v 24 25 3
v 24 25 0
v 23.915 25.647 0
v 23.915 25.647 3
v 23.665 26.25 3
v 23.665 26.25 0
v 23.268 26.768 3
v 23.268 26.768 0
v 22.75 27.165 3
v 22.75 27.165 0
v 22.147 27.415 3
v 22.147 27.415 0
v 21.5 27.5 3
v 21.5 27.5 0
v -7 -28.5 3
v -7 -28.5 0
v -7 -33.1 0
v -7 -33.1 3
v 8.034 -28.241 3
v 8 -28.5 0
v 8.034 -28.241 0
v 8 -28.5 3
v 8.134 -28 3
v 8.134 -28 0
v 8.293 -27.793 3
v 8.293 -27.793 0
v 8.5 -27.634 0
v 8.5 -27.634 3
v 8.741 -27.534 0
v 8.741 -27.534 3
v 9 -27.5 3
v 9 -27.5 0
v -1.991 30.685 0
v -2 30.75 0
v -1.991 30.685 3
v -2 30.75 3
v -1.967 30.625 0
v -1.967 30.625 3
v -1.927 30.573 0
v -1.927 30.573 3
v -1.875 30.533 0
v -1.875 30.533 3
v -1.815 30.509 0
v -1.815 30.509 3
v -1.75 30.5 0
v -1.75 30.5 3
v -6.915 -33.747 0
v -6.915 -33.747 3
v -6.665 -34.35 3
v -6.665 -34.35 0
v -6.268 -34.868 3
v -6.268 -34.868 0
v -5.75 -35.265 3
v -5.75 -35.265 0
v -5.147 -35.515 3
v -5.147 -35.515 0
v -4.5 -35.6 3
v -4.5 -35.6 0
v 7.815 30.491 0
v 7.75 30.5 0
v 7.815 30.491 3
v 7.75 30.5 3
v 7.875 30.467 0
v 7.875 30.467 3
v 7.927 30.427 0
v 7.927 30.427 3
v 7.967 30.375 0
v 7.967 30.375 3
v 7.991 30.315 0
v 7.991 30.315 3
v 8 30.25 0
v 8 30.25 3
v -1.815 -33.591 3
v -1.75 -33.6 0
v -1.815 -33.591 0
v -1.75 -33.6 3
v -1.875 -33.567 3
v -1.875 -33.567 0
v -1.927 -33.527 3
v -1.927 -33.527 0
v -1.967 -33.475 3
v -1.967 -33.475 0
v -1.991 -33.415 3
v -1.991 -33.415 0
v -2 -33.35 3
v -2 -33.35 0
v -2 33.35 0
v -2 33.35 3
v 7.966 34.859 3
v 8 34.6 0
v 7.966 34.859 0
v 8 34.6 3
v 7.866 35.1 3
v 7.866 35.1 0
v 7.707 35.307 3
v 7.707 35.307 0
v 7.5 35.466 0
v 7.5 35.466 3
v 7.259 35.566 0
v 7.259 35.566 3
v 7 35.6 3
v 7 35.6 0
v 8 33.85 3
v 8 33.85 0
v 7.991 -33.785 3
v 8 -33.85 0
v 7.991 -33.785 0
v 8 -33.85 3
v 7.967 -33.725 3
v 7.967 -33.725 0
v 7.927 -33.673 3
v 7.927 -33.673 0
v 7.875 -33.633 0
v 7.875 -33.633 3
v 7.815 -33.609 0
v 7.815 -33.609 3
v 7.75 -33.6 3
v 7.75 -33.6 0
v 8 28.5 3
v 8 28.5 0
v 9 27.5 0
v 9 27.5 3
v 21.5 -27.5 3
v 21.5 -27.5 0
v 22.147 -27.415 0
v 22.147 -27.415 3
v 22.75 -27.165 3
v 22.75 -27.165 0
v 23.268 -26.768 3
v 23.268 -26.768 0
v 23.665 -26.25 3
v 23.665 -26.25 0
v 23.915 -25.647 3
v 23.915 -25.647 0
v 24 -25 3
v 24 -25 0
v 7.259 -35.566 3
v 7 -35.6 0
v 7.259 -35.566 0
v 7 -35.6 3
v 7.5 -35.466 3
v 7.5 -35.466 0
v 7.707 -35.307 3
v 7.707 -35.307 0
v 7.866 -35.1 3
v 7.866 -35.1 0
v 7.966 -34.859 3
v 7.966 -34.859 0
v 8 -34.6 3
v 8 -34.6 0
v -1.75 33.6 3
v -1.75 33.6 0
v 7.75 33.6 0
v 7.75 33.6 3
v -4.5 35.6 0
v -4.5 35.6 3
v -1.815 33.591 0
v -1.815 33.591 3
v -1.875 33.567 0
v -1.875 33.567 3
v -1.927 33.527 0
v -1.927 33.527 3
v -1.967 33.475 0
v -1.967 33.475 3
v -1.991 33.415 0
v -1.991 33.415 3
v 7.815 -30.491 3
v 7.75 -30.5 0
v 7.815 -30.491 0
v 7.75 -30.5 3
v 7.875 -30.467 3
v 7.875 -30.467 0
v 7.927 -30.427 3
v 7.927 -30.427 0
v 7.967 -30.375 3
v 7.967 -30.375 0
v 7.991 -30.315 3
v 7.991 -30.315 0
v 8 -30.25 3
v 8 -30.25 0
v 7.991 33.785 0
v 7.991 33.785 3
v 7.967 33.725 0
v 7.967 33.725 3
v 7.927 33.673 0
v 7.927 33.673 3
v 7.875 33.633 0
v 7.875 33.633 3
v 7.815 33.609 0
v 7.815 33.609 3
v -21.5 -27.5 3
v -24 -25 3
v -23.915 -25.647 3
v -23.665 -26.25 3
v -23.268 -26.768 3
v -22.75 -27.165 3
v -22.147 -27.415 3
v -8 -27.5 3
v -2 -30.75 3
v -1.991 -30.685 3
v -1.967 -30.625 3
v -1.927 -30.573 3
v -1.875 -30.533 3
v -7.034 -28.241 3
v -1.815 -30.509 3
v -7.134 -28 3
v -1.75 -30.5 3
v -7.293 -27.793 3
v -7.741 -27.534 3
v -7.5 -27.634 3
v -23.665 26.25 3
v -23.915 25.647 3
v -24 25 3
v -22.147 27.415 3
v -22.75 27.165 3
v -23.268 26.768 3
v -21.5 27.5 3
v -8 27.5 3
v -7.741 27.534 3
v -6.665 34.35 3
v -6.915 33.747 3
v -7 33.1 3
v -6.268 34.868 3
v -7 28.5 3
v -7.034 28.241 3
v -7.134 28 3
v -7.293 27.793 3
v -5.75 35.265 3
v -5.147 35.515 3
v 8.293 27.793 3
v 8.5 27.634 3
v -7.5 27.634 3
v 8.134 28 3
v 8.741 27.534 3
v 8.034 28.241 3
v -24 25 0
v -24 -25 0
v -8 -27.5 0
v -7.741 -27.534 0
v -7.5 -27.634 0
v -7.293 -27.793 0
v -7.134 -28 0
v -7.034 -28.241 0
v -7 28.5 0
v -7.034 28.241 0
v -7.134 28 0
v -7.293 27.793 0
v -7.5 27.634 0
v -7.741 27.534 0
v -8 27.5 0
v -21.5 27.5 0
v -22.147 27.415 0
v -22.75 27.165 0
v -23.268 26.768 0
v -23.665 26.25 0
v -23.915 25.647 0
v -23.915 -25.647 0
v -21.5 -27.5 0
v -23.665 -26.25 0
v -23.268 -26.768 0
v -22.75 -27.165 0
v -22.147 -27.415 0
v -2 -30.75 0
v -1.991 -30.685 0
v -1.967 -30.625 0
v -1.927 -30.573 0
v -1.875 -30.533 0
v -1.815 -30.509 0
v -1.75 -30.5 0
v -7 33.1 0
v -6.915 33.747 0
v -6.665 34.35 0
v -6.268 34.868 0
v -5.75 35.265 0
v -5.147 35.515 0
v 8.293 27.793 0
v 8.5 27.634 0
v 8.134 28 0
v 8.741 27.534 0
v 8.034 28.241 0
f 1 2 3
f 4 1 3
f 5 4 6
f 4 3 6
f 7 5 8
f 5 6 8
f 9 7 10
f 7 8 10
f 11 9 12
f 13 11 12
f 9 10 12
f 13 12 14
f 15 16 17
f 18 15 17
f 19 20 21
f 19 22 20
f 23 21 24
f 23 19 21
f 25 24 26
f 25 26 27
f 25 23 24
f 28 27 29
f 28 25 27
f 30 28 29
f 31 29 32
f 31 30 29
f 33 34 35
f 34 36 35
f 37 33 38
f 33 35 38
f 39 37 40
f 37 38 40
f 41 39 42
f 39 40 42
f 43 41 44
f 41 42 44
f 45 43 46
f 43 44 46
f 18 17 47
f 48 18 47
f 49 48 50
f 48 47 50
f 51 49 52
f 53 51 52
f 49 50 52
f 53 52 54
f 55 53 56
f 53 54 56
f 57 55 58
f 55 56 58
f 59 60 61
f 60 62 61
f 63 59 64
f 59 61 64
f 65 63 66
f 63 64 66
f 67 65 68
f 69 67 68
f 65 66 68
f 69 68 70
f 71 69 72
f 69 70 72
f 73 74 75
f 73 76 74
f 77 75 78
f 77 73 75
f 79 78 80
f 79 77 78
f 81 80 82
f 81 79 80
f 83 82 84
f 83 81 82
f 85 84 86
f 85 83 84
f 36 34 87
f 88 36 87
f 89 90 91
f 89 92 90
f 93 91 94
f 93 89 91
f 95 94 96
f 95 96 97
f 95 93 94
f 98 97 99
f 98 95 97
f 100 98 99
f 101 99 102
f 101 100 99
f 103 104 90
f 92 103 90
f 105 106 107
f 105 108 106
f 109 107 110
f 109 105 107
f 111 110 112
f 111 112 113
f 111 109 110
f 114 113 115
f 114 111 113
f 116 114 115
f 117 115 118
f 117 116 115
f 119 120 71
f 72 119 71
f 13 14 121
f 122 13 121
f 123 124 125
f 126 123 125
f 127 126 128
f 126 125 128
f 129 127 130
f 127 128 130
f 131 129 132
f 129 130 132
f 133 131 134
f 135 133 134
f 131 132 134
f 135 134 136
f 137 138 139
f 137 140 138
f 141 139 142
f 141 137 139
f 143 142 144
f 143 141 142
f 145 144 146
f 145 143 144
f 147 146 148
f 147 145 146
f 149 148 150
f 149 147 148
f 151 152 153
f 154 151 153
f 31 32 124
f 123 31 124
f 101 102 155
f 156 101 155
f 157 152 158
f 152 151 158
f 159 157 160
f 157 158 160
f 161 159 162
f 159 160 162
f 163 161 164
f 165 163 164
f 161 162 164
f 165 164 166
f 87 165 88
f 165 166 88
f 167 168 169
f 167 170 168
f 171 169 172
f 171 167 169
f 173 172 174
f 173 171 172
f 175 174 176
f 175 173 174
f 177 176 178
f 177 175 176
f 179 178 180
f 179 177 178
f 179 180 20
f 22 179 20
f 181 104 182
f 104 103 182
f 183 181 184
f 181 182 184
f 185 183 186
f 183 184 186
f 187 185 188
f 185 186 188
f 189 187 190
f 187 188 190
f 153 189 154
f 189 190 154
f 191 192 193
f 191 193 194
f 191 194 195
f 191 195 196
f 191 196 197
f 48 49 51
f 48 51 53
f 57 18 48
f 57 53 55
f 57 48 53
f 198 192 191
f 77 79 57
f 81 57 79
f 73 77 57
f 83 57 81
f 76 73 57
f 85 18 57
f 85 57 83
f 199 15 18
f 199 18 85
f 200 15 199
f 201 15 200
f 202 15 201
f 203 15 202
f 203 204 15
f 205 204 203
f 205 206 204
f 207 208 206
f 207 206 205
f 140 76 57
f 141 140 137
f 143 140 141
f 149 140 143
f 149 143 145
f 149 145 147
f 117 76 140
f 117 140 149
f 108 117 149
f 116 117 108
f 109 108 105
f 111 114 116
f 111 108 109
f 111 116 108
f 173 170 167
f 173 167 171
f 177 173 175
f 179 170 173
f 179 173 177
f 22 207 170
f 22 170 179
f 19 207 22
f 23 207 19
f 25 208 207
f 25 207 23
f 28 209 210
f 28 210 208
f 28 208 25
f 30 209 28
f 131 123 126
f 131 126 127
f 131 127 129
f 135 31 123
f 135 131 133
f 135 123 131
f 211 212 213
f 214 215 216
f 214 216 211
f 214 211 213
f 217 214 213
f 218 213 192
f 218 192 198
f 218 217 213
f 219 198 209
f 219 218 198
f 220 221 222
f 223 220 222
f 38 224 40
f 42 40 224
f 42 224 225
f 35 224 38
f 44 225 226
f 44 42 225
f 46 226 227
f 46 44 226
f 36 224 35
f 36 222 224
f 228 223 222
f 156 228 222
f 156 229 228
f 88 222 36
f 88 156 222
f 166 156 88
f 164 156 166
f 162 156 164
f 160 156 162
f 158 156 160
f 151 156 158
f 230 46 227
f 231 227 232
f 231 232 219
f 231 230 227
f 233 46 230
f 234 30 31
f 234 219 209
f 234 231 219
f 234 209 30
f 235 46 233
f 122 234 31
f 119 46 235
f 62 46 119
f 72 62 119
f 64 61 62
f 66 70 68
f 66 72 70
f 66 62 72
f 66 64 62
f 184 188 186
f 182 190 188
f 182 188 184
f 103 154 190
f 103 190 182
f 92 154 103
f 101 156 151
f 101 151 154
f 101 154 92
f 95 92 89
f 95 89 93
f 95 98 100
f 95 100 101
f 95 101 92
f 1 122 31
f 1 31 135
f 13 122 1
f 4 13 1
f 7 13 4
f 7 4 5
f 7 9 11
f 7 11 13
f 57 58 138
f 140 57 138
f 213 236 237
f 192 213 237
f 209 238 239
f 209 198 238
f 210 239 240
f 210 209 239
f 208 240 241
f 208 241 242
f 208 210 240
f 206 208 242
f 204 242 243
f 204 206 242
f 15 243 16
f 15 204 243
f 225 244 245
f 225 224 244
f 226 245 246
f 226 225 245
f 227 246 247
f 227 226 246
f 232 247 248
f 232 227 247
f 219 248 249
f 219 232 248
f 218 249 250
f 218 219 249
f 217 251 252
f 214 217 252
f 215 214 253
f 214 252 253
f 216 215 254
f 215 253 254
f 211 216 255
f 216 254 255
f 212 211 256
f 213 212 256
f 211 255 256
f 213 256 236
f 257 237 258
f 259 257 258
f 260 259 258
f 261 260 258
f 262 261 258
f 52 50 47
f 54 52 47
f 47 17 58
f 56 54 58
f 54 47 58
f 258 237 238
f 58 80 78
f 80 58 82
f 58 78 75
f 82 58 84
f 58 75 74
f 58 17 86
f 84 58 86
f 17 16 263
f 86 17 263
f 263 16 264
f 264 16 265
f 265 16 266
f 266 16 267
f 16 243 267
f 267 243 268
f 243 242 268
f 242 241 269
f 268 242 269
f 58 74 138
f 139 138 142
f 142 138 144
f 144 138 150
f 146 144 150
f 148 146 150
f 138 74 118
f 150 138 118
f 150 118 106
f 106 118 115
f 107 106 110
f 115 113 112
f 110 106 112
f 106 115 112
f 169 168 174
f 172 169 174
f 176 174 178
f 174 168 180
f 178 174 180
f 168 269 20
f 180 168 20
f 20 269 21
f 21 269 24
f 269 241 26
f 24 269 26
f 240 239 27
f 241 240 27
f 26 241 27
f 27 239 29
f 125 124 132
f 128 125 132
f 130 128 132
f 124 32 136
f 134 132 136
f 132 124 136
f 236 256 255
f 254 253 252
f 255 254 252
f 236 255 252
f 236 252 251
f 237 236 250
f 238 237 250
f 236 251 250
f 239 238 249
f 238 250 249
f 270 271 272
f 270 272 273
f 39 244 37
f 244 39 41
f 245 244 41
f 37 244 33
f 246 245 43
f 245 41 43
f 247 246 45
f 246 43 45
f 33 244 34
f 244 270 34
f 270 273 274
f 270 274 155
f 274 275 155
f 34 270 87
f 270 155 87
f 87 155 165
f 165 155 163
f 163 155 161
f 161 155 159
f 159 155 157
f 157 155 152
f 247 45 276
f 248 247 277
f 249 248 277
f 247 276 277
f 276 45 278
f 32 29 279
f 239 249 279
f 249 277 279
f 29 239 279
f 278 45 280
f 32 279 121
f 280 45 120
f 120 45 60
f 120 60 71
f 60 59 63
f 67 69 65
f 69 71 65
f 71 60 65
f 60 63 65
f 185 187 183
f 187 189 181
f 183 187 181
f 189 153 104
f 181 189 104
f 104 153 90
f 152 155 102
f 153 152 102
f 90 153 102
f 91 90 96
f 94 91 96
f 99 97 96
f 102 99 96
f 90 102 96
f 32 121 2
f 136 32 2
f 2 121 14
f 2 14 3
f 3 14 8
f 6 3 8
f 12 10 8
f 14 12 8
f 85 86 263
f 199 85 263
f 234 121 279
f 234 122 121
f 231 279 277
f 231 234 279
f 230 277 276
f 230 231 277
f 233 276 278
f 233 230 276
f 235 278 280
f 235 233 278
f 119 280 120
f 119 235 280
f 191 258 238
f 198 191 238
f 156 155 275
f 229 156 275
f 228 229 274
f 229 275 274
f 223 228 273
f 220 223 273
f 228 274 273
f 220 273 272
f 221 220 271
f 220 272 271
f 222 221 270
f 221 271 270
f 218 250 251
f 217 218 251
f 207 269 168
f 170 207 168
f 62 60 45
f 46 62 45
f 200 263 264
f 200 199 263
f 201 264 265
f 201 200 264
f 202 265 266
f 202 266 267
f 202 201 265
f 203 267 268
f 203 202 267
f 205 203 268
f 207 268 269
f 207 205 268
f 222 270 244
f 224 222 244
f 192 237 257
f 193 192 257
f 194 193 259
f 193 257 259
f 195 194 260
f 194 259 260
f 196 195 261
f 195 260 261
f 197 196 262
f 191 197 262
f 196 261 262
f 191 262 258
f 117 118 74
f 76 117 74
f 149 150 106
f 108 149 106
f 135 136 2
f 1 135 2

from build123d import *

# Parameters (mm, degrees)
SALIENTE_EXTRUIR1_DEPTH = 3
REDONDEO1_R             = 1
REDONDEO2_R             = 0.25


with BuildPart() as part:
    # Croquis1 → Saliente-Extruir1 (new body)
    with BuildSketch(Plane.XY):
        with BuildLine():
            Line((-24, 25), (-24, -25))
            ThreePointArc((-24, -25), (-23.267766953, -26.767766953), (-21.5, -27.5))
            Line((-21.5, -27.5), (-7, -27.5))
            Line((-7, -27.5), (-7, -33.1))
            ThreePointArc((-7, -33.1), (-6.267766953, -34.867766953), (-4.5, -35.6))
            Line((-4.5, -35.6), (8, -35.6))
            Line((8, -35.6), (8, -33.6))
            Line((8, -33.6), (-2, -33.6))
            Line((-2, -33.6), (-2, -30.5))
            Line((-2, -30.5), (8, -30.5))
            Line((8, -30.5), (8, -27.5))
            Line((8, -27.5), (21.5, -27.5))
            ThreePointArc((21.5, -27.5), (23.267766953, -26.767766953), (24, -25))
            Line((24, -25), (24, 25))
            ThreePointArc((24, 25), (23.267766953, 26.767766953), (21.5, 27.5))
            Line((21.5, 27.5), (8, 27.5))
            Line((8, 27.5), (8, 30.5))
            Line((8, 30.5), (-2, 30.5))
            Line((-2, 30.5), (-2, 33.6))
            Line((-2, 33.6), (8, 33.6))
            Line((8, 33.6), (8, 35.6))
            Line((8, 35.6), (-4.5, 35.6))
            ThreePointArc((-4.5, 35.6), (-6.267766953, 34.867766953), (-7, 33.1))
            Line((-7, 33.1), (-7, 27.5))
            Line((-7, 27.5), (-21.5, 27.5))
            ThreePointArc((-21.5, 27.5), (-23.267766953, 26.767766953), (-24, 25))
        make_face()
    extrude(amount=SALIENTE_EXTRUIR1_DEPTH)

    # Redondeo1
    redondeo1_edges = [part.edges().sort_by_distance(p)[0] for p in [
        (-7, 27.5, 1.5),
        (8, 35.6, 1.5),
        (8, 27.5, 1.5),
        (8, -27.5, 1.5),
        (8, -35.6, 1.5),
        (-7, -27.5, 1.5),
    ]]
    fillet(redondeo1_edges, radius=REDONDEO1_R)

    # Redondeo2
    redondeo2_edges = [part.edges().sort_by_distance(p)[0] for p in [
        (8, 33.6, 1.5),
        (-2, 33.6, 1.5),
        (-2, 30.5, 1.5),
        (8, 30.5, 1.5),
        (8, -30.5, 1.5),
        (-2, -30.5, 1.5),
        (-2, -33.6, 1.5),
        (8, -33.6, 1.5),
    ]]
    fillet(redondeo2_edges, radius=REDONDEO2_R)


solid = part.part
